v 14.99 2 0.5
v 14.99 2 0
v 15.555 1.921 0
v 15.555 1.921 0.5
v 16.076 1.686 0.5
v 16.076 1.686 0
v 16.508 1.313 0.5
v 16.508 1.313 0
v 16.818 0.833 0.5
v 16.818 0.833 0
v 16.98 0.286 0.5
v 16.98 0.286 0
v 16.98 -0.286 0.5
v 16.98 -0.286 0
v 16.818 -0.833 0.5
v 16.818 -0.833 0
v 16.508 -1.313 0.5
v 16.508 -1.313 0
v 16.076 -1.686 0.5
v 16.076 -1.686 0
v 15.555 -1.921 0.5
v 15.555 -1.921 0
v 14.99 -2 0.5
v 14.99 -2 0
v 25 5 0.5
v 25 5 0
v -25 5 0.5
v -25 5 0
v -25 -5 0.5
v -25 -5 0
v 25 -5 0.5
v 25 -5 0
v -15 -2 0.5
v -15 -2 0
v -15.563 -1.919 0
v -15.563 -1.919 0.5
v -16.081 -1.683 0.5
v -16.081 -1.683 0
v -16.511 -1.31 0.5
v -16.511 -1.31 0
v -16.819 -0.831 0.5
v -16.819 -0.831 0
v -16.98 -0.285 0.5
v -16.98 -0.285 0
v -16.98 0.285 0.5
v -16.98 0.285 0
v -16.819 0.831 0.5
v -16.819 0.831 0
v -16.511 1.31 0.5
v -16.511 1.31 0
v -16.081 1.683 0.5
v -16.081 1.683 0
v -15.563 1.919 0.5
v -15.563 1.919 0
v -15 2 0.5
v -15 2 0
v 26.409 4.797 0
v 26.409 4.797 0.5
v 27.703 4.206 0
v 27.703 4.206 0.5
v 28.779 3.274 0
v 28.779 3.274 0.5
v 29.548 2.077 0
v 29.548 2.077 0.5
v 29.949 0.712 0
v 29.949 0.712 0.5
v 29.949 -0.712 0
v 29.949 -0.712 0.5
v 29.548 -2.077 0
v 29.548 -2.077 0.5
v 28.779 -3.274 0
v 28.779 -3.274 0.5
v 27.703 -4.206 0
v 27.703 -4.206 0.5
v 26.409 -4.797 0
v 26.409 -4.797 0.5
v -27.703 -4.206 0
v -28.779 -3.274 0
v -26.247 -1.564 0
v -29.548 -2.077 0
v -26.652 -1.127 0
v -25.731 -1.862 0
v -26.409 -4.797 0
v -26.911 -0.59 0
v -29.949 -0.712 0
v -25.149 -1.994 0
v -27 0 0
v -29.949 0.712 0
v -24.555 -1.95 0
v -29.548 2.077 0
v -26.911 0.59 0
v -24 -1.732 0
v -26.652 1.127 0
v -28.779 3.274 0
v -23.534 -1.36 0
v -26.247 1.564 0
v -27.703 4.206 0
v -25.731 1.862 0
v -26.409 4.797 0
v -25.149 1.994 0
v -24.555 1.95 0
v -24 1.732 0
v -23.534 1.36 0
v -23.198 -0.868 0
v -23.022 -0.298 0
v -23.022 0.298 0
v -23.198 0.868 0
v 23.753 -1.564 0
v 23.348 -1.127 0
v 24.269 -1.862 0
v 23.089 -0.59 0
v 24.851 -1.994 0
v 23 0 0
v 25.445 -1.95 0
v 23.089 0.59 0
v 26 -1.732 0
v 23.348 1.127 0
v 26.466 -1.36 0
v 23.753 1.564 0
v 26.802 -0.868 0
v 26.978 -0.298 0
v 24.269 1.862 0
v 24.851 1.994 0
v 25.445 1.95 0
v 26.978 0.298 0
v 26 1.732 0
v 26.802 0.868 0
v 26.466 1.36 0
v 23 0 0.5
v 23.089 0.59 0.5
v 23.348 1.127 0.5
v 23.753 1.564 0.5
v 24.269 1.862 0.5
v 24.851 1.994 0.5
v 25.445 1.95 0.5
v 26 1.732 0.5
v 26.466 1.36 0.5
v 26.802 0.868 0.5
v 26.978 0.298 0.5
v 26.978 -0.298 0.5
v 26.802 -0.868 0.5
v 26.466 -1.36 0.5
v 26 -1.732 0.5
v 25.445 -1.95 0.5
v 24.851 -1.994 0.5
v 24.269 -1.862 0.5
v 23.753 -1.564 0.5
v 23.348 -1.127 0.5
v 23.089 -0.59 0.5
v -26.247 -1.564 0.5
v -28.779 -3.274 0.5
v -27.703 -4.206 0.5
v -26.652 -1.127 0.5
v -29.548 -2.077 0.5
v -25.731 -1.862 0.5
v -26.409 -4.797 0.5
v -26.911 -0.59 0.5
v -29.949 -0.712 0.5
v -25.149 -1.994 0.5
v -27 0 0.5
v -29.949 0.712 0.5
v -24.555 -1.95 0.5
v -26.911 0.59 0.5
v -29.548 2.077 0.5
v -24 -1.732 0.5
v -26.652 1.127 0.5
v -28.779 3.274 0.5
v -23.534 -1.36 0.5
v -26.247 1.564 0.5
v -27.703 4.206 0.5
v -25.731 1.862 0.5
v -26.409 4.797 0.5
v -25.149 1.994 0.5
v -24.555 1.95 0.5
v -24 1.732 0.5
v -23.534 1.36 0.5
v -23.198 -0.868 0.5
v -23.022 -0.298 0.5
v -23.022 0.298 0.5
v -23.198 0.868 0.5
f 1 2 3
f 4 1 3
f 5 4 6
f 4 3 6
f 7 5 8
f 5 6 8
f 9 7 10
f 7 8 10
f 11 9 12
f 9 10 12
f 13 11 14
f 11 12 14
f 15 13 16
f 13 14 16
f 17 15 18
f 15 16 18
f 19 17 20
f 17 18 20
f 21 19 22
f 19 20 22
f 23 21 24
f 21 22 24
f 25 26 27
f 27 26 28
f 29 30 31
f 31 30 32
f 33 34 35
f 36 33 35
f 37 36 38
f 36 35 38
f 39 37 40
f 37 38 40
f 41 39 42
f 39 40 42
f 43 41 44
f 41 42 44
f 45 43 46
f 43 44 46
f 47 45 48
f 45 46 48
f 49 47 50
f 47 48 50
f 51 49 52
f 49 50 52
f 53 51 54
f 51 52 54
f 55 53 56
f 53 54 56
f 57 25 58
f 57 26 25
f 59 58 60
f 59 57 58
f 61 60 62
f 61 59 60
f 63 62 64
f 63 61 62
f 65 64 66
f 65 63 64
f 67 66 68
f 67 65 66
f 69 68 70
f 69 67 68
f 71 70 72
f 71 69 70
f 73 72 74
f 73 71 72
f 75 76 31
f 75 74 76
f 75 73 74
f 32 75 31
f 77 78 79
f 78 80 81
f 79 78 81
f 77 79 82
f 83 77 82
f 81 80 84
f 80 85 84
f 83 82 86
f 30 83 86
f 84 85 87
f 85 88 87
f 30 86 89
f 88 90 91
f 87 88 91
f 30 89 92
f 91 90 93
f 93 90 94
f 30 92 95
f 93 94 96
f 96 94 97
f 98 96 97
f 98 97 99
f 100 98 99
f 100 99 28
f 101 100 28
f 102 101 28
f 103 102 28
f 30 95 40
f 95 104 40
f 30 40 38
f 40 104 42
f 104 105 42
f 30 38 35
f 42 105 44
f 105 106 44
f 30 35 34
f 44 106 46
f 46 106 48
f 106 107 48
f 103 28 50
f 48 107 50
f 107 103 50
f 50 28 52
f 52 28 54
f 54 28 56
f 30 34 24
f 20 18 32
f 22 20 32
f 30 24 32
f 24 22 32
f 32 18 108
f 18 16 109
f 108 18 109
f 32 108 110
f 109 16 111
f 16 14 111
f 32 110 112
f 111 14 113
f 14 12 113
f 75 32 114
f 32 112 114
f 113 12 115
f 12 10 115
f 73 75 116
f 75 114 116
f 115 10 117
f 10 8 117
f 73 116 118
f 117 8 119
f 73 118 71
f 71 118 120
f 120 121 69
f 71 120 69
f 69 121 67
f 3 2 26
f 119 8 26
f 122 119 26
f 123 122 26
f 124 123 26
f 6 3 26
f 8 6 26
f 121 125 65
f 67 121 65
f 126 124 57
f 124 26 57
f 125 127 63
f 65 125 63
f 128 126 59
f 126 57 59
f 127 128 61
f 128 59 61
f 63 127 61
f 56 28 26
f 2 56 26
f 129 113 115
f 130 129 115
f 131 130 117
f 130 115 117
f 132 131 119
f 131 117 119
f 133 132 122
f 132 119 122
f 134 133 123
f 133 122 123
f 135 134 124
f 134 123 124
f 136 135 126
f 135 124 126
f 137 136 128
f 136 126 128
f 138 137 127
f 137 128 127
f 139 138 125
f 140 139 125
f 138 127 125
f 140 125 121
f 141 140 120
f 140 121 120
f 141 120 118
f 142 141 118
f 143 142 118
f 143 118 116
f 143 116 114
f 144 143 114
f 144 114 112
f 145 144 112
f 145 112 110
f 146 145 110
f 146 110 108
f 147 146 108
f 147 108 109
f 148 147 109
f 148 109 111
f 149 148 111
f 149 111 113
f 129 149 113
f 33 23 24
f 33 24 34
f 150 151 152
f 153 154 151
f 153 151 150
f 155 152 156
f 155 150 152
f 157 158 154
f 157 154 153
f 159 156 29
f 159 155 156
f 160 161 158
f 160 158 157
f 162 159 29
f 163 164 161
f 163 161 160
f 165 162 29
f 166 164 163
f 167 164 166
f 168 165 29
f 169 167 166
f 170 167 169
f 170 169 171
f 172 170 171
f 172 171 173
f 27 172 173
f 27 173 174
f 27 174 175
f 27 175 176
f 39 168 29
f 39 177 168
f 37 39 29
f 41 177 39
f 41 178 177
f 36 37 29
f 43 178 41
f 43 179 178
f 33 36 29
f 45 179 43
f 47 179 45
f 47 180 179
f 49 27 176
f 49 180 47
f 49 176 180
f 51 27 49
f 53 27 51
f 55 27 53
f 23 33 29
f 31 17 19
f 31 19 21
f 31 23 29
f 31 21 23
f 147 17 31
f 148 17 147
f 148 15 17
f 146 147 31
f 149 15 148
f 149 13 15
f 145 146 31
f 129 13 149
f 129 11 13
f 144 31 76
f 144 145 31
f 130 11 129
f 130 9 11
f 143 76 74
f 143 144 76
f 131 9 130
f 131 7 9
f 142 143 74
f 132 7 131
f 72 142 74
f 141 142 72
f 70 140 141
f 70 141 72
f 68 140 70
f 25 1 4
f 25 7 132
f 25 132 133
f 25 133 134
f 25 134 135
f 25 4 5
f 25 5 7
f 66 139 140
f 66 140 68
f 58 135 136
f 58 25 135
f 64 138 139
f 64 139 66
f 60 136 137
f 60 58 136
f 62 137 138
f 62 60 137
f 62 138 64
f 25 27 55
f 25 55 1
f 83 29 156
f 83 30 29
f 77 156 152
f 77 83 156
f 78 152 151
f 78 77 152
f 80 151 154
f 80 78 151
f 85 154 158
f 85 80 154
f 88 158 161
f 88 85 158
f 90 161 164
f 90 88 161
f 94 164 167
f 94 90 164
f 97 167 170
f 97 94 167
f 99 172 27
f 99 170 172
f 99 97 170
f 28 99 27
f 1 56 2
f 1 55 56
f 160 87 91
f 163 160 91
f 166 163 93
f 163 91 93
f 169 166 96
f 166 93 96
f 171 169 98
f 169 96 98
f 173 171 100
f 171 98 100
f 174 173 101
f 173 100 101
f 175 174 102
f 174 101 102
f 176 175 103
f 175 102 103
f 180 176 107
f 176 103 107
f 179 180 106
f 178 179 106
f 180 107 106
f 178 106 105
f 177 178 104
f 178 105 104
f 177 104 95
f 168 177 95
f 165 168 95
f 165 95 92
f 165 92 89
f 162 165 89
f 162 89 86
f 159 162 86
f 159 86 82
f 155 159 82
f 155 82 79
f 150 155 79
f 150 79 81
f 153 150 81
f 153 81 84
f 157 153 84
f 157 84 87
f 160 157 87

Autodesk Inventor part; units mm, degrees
ref_plane "YZ Plane" through (0, 0, 0) normal (1, 0, 0) x (0, 1, 0)
ref_plane "XZ Plane" through (0, 0, 0) normal (0, 1, 0) x (-1, 0, 0)
ref_plane "XY Plane" through (0, 0, 0) normal (0, 0, 1) x (1, 0, 0)
sketch "Náčrt1" plane through (0, 0, 0) normal (0, 0, 1) x (1, 0, 0)
  line L0 (-25, 0) -> (25, 0) construction
  line L1 (-25, -5) -> (25, -5)
  line L2 (25, 5) -> (-25, 5)
  arc A0 (-25, 5) -> (-25, -5) centre (-25, 0) ccw
  arc A1 (25, -5) -> (25, 5) centre (25, 0) ccw
  point P0 (0, 0)
  point P1 (30, 0)
  dimension "d0" = 30
  dimension "d1" = 5
extrude "Vysunutí1" add sketch "Náčrt1" along normal blind 0.5
sketch "Náčrt2" plane through (0, 0, 0) normal (0, 0, -1) x (-1, 0, 0)
  arc A0 (25, -5) -> (25, 5) centre (25, 0) ccw projected
  circle A1 centre (25, 0) radius 2
  point P0 (0, 0)
  dimension "d4" = 4
extrude "Vysunutí2" cut sketch "Náčrt2" against normal through all
pattern_linear "Obdélníkové pole1" count 7 spacing 10 along (1, 0, 0) of "Vysunutí2"
sketch "Náčrt3" plane through (0, 0, 0.5) normal (0, 0, 1) x (1, 0, 0)
  circle A0 centre (-15, 0) radius 2 projected
  line L0 (-15, 2) -> (14.9898, 2)
  line L1 (14.9898, 2) -> (14.9898, -2)
  line L2 (14.9898, -2) -> (-15, -2)
  point P0 (0, 0)
extrude "Vysunutí3" cut sketch "Náčrt3" against normal blind 10 contours A0 L0 L1 L2
properties part number "2006"
